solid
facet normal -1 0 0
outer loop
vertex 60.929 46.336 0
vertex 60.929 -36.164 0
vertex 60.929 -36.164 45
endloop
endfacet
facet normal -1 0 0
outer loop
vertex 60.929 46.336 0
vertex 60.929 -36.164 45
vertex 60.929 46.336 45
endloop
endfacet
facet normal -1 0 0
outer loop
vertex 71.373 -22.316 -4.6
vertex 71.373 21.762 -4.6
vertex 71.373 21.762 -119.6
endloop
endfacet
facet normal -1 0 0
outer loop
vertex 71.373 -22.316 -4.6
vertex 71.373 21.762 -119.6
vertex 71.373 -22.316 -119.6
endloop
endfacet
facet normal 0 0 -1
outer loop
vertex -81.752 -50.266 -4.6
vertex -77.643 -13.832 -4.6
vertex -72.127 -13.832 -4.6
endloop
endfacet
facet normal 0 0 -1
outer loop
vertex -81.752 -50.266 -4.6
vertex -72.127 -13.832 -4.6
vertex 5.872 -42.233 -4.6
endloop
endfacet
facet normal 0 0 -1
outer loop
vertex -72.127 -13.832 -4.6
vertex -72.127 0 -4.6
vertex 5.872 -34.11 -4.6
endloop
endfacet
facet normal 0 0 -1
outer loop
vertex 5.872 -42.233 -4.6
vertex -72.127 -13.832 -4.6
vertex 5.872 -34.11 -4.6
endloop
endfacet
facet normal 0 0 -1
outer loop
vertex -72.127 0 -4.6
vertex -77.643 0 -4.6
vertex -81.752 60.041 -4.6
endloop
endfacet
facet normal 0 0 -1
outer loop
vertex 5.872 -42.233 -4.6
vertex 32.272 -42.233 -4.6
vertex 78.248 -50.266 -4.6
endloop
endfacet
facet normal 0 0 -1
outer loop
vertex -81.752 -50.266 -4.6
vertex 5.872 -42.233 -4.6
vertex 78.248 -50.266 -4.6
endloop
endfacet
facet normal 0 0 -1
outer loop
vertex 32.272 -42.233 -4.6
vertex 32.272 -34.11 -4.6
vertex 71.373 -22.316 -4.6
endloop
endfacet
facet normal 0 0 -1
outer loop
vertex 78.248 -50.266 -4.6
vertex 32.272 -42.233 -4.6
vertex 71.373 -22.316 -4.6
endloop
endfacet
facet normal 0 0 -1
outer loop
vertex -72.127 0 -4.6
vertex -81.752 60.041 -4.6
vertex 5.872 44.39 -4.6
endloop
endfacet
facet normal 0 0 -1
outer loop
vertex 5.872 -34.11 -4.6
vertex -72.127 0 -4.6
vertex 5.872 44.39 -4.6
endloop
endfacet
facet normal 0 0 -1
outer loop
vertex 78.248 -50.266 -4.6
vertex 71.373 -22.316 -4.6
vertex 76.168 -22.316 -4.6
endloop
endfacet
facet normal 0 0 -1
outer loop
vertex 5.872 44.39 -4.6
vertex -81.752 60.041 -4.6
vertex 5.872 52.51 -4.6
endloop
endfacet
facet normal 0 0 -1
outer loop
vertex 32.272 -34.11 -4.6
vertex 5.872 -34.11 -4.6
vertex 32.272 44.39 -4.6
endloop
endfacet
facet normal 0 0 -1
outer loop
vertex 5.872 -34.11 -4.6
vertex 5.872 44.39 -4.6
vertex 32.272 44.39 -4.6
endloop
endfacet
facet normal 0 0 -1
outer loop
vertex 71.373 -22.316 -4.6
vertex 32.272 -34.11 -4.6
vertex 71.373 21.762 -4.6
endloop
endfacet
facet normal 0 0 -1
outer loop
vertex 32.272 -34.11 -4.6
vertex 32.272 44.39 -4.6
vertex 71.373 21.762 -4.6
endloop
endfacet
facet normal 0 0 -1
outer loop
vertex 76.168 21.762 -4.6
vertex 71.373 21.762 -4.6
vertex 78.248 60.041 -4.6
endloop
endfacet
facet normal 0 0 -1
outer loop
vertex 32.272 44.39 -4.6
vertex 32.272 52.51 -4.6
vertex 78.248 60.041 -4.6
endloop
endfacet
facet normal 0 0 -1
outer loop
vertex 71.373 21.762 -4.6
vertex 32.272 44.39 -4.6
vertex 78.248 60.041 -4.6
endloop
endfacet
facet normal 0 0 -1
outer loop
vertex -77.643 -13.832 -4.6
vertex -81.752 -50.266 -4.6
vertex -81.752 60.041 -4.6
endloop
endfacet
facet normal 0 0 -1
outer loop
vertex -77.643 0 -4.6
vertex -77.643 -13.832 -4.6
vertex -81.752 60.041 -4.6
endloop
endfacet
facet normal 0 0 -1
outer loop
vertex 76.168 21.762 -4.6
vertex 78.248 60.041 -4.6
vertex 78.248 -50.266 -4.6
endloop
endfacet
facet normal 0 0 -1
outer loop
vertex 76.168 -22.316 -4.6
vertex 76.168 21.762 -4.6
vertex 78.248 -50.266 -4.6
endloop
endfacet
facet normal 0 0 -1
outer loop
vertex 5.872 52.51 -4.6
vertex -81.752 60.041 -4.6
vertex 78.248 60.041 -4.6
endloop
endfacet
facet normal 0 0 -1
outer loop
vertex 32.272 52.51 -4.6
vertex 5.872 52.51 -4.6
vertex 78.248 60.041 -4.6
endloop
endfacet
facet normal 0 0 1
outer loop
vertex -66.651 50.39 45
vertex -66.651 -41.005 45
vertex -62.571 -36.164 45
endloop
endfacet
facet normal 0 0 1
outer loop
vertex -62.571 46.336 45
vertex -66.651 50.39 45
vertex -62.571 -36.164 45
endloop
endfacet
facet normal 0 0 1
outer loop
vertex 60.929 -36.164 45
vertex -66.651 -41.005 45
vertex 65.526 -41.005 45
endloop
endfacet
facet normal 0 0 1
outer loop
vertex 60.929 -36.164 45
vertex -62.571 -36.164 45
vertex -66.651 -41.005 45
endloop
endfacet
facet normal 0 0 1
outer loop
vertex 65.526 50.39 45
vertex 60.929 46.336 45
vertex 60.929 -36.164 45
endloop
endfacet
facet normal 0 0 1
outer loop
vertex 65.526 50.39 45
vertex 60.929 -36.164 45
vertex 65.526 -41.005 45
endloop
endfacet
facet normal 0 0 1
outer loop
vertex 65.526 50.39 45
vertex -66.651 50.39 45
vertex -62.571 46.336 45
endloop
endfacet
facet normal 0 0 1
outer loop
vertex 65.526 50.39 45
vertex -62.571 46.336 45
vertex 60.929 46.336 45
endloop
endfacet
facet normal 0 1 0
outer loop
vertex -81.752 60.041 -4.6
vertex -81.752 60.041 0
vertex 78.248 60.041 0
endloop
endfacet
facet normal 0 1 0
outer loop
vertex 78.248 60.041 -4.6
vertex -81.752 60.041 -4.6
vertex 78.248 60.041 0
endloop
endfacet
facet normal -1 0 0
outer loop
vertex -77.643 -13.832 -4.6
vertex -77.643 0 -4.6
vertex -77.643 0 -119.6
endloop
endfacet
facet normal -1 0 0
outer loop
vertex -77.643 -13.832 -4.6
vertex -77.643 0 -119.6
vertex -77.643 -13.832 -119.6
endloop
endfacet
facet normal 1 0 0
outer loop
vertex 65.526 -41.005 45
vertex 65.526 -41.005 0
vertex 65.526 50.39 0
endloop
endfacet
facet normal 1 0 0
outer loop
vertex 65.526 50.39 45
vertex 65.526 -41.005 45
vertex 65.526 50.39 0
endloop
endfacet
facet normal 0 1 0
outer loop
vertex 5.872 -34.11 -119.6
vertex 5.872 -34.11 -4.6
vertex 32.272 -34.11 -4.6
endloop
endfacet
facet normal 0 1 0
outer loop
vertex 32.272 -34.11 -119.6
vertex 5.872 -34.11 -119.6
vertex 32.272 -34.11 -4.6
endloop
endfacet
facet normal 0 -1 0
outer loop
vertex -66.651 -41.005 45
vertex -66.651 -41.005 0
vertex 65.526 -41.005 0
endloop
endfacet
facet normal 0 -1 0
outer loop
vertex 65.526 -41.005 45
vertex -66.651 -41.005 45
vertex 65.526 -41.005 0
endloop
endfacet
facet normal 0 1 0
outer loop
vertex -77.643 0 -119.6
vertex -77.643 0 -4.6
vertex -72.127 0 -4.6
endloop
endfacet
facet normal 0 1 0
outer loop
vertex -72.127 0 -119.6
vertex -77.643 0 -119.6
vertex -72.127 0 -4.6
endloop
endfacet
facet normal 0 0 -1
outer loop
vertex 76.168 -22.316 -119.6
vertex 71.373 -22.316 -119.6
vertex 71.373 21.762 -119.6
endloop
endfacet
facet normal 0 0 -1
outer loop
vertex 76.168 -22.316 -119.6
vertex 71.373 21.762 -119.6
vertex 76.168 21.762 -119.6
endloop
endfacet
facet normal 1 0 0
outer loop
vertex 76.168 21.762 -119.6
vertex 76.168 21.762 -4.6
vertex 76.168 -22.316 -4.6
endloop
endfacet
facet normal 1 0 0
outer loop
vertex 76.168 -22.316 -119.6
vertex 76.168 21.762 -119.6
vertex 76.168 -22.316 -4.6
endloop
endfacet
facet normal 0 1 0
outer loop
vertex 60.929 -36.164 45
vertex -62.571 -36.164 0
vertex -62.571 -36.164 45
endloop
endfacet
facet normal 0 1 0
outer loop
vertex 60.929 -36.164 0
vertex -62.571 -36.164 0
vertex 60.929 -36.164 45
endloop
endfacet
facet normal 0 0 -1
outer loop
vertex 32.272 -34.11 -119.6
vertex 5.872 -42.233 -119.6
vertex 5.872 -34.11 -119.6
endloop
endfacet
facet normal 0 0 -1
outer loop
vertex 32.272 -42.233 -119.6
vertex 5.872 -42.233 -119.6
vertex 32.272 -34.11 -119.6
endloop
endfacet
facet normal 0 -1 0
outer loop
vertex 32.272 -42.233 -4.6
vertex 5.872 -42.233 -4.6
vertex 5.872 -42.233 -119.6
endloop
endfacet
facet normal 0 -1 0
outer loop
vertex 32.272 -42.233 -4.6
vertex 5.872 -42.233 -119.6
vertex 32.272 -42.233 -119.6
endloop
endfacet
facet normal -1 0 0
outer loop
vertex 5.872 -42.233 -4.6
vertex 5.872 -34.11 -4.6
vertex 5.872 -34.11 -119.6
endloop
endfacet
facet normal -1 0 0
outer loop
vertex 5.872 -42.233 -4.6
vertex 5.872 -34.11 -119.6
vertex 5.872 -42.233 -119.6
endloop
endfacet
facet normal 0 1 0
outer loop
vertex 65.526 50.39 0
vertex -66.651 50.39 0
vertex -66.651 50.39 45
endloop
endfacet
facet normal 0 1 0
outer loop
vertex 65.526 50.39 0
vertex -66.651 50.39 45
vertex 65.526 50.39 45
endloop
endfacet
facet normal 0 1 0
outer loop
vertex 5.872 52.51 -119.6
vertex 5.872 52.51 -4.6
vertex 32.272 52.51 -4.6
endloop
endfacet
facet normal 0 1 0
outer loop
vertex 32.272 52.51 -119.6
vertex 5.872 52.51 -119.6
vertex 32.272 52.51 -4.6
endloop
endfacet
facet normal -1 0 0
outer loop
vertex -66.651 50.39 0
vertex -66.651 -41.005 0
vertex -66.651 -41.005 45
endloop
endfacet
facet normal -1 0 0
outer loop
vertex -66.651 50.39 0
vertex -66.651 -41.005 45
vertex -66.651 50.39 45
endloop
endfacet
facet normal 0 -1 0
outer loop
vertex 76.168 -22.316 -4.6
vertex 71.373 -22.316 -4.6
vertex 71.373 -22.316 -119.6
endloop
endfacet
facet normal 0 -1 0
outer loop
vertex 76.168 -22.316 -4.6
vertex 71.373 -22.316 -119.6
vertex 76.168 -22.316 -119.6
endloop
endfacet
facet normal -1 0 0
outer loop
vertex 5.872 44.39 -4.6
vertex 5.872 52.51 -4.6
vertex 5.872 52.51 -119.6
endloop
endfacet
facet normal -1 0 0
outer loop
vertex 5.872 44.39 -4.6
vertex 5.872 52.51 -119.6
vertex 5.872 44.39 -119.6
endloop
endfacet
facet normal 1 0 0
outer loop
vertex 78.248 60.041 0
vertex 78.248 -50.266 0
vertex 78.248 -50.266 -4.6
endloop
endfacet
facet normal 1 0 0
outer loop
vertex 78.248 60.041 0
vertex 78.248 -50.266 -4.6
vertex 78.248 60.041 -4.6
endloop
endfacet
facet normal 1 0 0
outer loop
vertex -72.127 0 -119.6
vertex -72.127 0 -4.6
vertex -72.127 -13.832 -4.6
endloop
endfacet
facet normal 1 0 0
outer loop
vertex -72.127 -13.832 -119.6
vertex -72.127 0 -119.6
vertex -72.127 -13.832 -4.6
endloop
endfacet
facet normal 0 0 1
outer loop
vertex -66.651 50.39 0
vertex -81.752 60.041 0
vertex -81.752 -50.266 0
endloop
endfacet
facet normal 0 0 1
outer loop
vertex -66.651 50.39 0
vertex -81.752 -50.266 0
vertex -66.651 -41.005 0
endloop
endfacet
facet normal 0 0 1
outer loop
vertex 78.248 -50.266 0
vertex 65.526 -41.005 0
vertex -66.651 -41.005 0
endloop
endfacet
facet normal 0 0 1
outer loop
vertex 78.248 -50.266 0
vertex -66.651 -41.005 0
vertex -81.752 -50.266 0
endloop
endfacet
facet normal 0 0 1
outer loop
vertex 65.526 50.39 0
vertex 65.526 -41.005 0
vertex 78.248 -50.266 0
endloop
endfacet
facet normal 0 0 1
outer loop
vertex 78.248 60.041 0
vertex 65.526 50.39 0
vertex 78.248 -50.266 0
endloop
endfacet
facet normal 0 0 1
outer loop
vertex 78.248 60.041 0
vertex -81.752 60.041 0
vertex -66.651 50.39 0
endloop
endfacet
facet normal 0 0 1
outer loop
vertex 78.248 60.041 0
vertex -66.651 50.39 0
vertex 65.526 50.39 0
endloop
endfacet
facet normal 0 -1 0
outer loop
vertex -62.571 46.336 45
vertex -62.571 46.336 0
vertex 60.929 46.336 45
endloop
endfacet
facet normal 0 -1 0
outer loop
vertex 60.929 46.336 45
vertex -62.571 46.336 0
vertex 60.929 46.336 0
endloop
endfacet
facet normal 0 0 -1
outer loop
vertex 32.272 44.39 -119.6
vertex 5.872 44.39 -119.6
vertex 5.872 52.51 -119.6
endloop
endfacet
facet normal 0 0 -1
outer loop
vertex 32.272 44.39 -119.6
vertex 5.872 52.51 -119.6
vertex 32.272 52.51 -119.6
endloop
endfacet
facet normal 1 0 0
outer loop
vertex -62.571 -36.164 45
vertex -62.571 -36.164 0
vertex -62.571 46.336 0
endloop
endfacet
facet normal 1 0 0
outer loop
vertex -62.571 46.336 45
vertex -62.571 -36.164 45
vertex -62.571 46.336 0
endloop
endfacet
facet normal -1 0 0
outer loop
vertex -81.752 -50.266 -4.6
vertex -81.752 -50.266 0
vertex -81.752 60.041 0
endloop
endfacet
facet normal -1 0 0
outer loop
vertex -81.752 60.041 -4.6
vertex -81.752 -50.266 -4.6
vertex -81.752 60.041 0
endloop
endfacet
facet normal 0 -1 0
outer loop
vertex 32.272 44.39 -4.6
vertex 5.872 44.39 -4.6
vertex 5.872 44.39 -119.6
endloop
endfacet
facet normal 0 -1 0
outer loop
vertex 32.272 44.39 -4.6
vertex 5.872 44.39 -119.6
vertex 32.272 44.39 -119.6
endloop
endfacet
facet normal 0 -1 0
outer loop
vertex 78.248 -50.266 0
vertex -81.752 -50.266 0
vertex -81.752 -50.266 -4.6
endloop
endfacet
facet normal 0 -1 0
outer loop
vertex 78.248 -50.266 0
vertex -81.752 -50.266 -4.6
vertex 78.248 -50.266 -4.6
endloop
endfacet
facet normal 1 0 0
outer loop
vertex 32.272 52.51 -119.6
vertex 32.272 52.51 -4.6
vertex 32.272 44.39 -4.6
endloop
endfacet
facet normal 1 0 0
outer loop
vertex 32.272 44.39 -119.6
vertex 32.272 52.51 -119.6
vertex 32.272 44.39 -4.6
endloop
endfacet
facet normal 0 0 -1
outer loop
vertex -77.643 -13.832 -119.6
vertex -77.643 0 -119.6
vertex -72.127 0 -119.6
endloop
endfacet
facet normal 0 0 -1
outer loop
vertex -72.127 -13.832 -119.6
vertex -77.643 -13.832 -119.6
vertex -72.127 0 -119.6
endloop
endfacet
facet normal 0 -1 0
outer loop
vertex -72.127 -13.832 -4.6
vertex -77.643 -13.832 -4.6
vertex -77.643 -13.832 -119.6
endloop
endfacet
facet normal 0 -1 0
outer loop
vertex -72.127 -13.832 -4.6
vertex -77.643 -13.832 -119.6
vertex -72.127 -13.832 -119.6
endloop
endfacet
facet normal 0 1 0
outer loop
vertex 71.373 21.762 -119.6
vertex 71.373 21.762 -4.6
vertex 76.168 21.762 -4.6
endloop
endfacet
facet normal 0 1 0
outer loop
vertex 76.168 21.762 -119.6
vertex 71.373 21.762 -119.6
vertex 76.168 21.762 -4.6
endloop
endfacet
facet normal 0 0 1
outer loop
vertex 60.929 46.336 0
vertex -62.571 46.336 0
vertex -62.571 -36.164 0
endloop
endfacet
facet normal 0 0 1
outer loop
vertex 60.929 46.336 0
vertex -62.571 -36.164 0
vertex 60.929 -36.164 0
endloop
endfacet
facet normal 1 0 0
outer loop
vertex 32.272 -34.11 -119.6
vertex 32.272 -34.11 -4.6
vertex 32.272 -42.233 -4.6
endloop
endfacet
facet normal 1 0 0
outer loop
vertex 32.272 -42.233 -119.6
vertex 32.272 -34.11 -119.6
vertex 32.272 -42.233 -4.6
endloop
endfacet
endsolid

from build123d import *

# Parameters (mm, degrees)
F0_W     = 132.1772886384
F0_H     = 91.3944654167
F0_W_2   = 123.5
F0_H_2   = 82.5
F1_DEPTH = 45
F2_W     = 160
F2_H     = 110.3064134685
F3_DEPTH = 4.6
F4_W     = 26.40013583
F4_H     = 8.1236897111
F4_H_2   = 8.12
F5_DEPTH = 115
F6_W     = 4.7950819135
F6_H     = 44.0778695047
F7_DEPTH = 115
F8_W     = 5.5164026618
F8_H     = 13.8319674879
F9_DEPTH = 115


# Not quite as in the source:
# - the program builds the solid bodies; features that only make, move or delete a surface that nothing else refers to are left out


with BuildPart() as f1:
    # F0 (on Top) → F1 (new body)
    with BuildSketch(Plane.XY):
        with Locations((-0.5622557336, 4.6925004572)):
            Rectangle(F0_W, F0_H)
        with Locations((-0.8209000528, 5.0862303376)):
            Rectangle(F0_W_2, F0_H_2, mode=Mode.SUBTRACT)
    extrude(amount=F1_DEPTH)

    # F2 (on Top) → F3 (join)
    with BuildSketch(Plane.XY):
        with Locations((-1.752063632, 4.8872958869)):
            Rectangle(F2_W, F2_H)
    extrude(amount=-F3_DEPTH)

    # F4 (on face) → F5 (join)
    with BuildSketch(Plane(origin=(0, 0, -4.6), x_dir=(1, 0, 0), z_dir=(0, 0, -1))):
        with Locations((19.0718499944, 38.1715348911)):
            Rectangle(F4_W, F4_H)
        with Locations((19.0718499944, -48.4503099644)):
            Rectangle(F4_W, F4_H_2)
    extrude(amount=F5_DEPTH)

    # F6 (on face) + F4 (on face) → F7 (join)
    with BuildSketch(Plane(origin=(0, 0, -4.6), x_dir=(1, 0, 0), z_dir=(0, 0, -1))):
        with Locations((73.7704820931, 0.2766400576)):
            Rectangle(F6_W, F6_H)
    with BuildSketch(Plane(origin=(0, 0, -4.6), x_dir=(1, 0, 0), z_dir=(0, 0, -1))):
        with Locations((19.0718499944, 38.1715348911)):
            Rectangle(F4_W, F4_H)
        with Locations((19.0718499944, -48.4503099644)):
            Rectangle(F4_W, F4_H_2)
    extrude(amount=F7_DEPTH)

    # F8 (on face) → F9 (join)
    with BuildSketch(Plane(origin=(0, 0, -4.6), x_dir=(1, 0, 0), z_dir=(0, 0, -1))):
        with Locations((-74.8852601945, 6.915983744)):
            Rectangle(F8_W, F8_H)
    extrude(amount=F9_DEPTH)


solid = f1.part
